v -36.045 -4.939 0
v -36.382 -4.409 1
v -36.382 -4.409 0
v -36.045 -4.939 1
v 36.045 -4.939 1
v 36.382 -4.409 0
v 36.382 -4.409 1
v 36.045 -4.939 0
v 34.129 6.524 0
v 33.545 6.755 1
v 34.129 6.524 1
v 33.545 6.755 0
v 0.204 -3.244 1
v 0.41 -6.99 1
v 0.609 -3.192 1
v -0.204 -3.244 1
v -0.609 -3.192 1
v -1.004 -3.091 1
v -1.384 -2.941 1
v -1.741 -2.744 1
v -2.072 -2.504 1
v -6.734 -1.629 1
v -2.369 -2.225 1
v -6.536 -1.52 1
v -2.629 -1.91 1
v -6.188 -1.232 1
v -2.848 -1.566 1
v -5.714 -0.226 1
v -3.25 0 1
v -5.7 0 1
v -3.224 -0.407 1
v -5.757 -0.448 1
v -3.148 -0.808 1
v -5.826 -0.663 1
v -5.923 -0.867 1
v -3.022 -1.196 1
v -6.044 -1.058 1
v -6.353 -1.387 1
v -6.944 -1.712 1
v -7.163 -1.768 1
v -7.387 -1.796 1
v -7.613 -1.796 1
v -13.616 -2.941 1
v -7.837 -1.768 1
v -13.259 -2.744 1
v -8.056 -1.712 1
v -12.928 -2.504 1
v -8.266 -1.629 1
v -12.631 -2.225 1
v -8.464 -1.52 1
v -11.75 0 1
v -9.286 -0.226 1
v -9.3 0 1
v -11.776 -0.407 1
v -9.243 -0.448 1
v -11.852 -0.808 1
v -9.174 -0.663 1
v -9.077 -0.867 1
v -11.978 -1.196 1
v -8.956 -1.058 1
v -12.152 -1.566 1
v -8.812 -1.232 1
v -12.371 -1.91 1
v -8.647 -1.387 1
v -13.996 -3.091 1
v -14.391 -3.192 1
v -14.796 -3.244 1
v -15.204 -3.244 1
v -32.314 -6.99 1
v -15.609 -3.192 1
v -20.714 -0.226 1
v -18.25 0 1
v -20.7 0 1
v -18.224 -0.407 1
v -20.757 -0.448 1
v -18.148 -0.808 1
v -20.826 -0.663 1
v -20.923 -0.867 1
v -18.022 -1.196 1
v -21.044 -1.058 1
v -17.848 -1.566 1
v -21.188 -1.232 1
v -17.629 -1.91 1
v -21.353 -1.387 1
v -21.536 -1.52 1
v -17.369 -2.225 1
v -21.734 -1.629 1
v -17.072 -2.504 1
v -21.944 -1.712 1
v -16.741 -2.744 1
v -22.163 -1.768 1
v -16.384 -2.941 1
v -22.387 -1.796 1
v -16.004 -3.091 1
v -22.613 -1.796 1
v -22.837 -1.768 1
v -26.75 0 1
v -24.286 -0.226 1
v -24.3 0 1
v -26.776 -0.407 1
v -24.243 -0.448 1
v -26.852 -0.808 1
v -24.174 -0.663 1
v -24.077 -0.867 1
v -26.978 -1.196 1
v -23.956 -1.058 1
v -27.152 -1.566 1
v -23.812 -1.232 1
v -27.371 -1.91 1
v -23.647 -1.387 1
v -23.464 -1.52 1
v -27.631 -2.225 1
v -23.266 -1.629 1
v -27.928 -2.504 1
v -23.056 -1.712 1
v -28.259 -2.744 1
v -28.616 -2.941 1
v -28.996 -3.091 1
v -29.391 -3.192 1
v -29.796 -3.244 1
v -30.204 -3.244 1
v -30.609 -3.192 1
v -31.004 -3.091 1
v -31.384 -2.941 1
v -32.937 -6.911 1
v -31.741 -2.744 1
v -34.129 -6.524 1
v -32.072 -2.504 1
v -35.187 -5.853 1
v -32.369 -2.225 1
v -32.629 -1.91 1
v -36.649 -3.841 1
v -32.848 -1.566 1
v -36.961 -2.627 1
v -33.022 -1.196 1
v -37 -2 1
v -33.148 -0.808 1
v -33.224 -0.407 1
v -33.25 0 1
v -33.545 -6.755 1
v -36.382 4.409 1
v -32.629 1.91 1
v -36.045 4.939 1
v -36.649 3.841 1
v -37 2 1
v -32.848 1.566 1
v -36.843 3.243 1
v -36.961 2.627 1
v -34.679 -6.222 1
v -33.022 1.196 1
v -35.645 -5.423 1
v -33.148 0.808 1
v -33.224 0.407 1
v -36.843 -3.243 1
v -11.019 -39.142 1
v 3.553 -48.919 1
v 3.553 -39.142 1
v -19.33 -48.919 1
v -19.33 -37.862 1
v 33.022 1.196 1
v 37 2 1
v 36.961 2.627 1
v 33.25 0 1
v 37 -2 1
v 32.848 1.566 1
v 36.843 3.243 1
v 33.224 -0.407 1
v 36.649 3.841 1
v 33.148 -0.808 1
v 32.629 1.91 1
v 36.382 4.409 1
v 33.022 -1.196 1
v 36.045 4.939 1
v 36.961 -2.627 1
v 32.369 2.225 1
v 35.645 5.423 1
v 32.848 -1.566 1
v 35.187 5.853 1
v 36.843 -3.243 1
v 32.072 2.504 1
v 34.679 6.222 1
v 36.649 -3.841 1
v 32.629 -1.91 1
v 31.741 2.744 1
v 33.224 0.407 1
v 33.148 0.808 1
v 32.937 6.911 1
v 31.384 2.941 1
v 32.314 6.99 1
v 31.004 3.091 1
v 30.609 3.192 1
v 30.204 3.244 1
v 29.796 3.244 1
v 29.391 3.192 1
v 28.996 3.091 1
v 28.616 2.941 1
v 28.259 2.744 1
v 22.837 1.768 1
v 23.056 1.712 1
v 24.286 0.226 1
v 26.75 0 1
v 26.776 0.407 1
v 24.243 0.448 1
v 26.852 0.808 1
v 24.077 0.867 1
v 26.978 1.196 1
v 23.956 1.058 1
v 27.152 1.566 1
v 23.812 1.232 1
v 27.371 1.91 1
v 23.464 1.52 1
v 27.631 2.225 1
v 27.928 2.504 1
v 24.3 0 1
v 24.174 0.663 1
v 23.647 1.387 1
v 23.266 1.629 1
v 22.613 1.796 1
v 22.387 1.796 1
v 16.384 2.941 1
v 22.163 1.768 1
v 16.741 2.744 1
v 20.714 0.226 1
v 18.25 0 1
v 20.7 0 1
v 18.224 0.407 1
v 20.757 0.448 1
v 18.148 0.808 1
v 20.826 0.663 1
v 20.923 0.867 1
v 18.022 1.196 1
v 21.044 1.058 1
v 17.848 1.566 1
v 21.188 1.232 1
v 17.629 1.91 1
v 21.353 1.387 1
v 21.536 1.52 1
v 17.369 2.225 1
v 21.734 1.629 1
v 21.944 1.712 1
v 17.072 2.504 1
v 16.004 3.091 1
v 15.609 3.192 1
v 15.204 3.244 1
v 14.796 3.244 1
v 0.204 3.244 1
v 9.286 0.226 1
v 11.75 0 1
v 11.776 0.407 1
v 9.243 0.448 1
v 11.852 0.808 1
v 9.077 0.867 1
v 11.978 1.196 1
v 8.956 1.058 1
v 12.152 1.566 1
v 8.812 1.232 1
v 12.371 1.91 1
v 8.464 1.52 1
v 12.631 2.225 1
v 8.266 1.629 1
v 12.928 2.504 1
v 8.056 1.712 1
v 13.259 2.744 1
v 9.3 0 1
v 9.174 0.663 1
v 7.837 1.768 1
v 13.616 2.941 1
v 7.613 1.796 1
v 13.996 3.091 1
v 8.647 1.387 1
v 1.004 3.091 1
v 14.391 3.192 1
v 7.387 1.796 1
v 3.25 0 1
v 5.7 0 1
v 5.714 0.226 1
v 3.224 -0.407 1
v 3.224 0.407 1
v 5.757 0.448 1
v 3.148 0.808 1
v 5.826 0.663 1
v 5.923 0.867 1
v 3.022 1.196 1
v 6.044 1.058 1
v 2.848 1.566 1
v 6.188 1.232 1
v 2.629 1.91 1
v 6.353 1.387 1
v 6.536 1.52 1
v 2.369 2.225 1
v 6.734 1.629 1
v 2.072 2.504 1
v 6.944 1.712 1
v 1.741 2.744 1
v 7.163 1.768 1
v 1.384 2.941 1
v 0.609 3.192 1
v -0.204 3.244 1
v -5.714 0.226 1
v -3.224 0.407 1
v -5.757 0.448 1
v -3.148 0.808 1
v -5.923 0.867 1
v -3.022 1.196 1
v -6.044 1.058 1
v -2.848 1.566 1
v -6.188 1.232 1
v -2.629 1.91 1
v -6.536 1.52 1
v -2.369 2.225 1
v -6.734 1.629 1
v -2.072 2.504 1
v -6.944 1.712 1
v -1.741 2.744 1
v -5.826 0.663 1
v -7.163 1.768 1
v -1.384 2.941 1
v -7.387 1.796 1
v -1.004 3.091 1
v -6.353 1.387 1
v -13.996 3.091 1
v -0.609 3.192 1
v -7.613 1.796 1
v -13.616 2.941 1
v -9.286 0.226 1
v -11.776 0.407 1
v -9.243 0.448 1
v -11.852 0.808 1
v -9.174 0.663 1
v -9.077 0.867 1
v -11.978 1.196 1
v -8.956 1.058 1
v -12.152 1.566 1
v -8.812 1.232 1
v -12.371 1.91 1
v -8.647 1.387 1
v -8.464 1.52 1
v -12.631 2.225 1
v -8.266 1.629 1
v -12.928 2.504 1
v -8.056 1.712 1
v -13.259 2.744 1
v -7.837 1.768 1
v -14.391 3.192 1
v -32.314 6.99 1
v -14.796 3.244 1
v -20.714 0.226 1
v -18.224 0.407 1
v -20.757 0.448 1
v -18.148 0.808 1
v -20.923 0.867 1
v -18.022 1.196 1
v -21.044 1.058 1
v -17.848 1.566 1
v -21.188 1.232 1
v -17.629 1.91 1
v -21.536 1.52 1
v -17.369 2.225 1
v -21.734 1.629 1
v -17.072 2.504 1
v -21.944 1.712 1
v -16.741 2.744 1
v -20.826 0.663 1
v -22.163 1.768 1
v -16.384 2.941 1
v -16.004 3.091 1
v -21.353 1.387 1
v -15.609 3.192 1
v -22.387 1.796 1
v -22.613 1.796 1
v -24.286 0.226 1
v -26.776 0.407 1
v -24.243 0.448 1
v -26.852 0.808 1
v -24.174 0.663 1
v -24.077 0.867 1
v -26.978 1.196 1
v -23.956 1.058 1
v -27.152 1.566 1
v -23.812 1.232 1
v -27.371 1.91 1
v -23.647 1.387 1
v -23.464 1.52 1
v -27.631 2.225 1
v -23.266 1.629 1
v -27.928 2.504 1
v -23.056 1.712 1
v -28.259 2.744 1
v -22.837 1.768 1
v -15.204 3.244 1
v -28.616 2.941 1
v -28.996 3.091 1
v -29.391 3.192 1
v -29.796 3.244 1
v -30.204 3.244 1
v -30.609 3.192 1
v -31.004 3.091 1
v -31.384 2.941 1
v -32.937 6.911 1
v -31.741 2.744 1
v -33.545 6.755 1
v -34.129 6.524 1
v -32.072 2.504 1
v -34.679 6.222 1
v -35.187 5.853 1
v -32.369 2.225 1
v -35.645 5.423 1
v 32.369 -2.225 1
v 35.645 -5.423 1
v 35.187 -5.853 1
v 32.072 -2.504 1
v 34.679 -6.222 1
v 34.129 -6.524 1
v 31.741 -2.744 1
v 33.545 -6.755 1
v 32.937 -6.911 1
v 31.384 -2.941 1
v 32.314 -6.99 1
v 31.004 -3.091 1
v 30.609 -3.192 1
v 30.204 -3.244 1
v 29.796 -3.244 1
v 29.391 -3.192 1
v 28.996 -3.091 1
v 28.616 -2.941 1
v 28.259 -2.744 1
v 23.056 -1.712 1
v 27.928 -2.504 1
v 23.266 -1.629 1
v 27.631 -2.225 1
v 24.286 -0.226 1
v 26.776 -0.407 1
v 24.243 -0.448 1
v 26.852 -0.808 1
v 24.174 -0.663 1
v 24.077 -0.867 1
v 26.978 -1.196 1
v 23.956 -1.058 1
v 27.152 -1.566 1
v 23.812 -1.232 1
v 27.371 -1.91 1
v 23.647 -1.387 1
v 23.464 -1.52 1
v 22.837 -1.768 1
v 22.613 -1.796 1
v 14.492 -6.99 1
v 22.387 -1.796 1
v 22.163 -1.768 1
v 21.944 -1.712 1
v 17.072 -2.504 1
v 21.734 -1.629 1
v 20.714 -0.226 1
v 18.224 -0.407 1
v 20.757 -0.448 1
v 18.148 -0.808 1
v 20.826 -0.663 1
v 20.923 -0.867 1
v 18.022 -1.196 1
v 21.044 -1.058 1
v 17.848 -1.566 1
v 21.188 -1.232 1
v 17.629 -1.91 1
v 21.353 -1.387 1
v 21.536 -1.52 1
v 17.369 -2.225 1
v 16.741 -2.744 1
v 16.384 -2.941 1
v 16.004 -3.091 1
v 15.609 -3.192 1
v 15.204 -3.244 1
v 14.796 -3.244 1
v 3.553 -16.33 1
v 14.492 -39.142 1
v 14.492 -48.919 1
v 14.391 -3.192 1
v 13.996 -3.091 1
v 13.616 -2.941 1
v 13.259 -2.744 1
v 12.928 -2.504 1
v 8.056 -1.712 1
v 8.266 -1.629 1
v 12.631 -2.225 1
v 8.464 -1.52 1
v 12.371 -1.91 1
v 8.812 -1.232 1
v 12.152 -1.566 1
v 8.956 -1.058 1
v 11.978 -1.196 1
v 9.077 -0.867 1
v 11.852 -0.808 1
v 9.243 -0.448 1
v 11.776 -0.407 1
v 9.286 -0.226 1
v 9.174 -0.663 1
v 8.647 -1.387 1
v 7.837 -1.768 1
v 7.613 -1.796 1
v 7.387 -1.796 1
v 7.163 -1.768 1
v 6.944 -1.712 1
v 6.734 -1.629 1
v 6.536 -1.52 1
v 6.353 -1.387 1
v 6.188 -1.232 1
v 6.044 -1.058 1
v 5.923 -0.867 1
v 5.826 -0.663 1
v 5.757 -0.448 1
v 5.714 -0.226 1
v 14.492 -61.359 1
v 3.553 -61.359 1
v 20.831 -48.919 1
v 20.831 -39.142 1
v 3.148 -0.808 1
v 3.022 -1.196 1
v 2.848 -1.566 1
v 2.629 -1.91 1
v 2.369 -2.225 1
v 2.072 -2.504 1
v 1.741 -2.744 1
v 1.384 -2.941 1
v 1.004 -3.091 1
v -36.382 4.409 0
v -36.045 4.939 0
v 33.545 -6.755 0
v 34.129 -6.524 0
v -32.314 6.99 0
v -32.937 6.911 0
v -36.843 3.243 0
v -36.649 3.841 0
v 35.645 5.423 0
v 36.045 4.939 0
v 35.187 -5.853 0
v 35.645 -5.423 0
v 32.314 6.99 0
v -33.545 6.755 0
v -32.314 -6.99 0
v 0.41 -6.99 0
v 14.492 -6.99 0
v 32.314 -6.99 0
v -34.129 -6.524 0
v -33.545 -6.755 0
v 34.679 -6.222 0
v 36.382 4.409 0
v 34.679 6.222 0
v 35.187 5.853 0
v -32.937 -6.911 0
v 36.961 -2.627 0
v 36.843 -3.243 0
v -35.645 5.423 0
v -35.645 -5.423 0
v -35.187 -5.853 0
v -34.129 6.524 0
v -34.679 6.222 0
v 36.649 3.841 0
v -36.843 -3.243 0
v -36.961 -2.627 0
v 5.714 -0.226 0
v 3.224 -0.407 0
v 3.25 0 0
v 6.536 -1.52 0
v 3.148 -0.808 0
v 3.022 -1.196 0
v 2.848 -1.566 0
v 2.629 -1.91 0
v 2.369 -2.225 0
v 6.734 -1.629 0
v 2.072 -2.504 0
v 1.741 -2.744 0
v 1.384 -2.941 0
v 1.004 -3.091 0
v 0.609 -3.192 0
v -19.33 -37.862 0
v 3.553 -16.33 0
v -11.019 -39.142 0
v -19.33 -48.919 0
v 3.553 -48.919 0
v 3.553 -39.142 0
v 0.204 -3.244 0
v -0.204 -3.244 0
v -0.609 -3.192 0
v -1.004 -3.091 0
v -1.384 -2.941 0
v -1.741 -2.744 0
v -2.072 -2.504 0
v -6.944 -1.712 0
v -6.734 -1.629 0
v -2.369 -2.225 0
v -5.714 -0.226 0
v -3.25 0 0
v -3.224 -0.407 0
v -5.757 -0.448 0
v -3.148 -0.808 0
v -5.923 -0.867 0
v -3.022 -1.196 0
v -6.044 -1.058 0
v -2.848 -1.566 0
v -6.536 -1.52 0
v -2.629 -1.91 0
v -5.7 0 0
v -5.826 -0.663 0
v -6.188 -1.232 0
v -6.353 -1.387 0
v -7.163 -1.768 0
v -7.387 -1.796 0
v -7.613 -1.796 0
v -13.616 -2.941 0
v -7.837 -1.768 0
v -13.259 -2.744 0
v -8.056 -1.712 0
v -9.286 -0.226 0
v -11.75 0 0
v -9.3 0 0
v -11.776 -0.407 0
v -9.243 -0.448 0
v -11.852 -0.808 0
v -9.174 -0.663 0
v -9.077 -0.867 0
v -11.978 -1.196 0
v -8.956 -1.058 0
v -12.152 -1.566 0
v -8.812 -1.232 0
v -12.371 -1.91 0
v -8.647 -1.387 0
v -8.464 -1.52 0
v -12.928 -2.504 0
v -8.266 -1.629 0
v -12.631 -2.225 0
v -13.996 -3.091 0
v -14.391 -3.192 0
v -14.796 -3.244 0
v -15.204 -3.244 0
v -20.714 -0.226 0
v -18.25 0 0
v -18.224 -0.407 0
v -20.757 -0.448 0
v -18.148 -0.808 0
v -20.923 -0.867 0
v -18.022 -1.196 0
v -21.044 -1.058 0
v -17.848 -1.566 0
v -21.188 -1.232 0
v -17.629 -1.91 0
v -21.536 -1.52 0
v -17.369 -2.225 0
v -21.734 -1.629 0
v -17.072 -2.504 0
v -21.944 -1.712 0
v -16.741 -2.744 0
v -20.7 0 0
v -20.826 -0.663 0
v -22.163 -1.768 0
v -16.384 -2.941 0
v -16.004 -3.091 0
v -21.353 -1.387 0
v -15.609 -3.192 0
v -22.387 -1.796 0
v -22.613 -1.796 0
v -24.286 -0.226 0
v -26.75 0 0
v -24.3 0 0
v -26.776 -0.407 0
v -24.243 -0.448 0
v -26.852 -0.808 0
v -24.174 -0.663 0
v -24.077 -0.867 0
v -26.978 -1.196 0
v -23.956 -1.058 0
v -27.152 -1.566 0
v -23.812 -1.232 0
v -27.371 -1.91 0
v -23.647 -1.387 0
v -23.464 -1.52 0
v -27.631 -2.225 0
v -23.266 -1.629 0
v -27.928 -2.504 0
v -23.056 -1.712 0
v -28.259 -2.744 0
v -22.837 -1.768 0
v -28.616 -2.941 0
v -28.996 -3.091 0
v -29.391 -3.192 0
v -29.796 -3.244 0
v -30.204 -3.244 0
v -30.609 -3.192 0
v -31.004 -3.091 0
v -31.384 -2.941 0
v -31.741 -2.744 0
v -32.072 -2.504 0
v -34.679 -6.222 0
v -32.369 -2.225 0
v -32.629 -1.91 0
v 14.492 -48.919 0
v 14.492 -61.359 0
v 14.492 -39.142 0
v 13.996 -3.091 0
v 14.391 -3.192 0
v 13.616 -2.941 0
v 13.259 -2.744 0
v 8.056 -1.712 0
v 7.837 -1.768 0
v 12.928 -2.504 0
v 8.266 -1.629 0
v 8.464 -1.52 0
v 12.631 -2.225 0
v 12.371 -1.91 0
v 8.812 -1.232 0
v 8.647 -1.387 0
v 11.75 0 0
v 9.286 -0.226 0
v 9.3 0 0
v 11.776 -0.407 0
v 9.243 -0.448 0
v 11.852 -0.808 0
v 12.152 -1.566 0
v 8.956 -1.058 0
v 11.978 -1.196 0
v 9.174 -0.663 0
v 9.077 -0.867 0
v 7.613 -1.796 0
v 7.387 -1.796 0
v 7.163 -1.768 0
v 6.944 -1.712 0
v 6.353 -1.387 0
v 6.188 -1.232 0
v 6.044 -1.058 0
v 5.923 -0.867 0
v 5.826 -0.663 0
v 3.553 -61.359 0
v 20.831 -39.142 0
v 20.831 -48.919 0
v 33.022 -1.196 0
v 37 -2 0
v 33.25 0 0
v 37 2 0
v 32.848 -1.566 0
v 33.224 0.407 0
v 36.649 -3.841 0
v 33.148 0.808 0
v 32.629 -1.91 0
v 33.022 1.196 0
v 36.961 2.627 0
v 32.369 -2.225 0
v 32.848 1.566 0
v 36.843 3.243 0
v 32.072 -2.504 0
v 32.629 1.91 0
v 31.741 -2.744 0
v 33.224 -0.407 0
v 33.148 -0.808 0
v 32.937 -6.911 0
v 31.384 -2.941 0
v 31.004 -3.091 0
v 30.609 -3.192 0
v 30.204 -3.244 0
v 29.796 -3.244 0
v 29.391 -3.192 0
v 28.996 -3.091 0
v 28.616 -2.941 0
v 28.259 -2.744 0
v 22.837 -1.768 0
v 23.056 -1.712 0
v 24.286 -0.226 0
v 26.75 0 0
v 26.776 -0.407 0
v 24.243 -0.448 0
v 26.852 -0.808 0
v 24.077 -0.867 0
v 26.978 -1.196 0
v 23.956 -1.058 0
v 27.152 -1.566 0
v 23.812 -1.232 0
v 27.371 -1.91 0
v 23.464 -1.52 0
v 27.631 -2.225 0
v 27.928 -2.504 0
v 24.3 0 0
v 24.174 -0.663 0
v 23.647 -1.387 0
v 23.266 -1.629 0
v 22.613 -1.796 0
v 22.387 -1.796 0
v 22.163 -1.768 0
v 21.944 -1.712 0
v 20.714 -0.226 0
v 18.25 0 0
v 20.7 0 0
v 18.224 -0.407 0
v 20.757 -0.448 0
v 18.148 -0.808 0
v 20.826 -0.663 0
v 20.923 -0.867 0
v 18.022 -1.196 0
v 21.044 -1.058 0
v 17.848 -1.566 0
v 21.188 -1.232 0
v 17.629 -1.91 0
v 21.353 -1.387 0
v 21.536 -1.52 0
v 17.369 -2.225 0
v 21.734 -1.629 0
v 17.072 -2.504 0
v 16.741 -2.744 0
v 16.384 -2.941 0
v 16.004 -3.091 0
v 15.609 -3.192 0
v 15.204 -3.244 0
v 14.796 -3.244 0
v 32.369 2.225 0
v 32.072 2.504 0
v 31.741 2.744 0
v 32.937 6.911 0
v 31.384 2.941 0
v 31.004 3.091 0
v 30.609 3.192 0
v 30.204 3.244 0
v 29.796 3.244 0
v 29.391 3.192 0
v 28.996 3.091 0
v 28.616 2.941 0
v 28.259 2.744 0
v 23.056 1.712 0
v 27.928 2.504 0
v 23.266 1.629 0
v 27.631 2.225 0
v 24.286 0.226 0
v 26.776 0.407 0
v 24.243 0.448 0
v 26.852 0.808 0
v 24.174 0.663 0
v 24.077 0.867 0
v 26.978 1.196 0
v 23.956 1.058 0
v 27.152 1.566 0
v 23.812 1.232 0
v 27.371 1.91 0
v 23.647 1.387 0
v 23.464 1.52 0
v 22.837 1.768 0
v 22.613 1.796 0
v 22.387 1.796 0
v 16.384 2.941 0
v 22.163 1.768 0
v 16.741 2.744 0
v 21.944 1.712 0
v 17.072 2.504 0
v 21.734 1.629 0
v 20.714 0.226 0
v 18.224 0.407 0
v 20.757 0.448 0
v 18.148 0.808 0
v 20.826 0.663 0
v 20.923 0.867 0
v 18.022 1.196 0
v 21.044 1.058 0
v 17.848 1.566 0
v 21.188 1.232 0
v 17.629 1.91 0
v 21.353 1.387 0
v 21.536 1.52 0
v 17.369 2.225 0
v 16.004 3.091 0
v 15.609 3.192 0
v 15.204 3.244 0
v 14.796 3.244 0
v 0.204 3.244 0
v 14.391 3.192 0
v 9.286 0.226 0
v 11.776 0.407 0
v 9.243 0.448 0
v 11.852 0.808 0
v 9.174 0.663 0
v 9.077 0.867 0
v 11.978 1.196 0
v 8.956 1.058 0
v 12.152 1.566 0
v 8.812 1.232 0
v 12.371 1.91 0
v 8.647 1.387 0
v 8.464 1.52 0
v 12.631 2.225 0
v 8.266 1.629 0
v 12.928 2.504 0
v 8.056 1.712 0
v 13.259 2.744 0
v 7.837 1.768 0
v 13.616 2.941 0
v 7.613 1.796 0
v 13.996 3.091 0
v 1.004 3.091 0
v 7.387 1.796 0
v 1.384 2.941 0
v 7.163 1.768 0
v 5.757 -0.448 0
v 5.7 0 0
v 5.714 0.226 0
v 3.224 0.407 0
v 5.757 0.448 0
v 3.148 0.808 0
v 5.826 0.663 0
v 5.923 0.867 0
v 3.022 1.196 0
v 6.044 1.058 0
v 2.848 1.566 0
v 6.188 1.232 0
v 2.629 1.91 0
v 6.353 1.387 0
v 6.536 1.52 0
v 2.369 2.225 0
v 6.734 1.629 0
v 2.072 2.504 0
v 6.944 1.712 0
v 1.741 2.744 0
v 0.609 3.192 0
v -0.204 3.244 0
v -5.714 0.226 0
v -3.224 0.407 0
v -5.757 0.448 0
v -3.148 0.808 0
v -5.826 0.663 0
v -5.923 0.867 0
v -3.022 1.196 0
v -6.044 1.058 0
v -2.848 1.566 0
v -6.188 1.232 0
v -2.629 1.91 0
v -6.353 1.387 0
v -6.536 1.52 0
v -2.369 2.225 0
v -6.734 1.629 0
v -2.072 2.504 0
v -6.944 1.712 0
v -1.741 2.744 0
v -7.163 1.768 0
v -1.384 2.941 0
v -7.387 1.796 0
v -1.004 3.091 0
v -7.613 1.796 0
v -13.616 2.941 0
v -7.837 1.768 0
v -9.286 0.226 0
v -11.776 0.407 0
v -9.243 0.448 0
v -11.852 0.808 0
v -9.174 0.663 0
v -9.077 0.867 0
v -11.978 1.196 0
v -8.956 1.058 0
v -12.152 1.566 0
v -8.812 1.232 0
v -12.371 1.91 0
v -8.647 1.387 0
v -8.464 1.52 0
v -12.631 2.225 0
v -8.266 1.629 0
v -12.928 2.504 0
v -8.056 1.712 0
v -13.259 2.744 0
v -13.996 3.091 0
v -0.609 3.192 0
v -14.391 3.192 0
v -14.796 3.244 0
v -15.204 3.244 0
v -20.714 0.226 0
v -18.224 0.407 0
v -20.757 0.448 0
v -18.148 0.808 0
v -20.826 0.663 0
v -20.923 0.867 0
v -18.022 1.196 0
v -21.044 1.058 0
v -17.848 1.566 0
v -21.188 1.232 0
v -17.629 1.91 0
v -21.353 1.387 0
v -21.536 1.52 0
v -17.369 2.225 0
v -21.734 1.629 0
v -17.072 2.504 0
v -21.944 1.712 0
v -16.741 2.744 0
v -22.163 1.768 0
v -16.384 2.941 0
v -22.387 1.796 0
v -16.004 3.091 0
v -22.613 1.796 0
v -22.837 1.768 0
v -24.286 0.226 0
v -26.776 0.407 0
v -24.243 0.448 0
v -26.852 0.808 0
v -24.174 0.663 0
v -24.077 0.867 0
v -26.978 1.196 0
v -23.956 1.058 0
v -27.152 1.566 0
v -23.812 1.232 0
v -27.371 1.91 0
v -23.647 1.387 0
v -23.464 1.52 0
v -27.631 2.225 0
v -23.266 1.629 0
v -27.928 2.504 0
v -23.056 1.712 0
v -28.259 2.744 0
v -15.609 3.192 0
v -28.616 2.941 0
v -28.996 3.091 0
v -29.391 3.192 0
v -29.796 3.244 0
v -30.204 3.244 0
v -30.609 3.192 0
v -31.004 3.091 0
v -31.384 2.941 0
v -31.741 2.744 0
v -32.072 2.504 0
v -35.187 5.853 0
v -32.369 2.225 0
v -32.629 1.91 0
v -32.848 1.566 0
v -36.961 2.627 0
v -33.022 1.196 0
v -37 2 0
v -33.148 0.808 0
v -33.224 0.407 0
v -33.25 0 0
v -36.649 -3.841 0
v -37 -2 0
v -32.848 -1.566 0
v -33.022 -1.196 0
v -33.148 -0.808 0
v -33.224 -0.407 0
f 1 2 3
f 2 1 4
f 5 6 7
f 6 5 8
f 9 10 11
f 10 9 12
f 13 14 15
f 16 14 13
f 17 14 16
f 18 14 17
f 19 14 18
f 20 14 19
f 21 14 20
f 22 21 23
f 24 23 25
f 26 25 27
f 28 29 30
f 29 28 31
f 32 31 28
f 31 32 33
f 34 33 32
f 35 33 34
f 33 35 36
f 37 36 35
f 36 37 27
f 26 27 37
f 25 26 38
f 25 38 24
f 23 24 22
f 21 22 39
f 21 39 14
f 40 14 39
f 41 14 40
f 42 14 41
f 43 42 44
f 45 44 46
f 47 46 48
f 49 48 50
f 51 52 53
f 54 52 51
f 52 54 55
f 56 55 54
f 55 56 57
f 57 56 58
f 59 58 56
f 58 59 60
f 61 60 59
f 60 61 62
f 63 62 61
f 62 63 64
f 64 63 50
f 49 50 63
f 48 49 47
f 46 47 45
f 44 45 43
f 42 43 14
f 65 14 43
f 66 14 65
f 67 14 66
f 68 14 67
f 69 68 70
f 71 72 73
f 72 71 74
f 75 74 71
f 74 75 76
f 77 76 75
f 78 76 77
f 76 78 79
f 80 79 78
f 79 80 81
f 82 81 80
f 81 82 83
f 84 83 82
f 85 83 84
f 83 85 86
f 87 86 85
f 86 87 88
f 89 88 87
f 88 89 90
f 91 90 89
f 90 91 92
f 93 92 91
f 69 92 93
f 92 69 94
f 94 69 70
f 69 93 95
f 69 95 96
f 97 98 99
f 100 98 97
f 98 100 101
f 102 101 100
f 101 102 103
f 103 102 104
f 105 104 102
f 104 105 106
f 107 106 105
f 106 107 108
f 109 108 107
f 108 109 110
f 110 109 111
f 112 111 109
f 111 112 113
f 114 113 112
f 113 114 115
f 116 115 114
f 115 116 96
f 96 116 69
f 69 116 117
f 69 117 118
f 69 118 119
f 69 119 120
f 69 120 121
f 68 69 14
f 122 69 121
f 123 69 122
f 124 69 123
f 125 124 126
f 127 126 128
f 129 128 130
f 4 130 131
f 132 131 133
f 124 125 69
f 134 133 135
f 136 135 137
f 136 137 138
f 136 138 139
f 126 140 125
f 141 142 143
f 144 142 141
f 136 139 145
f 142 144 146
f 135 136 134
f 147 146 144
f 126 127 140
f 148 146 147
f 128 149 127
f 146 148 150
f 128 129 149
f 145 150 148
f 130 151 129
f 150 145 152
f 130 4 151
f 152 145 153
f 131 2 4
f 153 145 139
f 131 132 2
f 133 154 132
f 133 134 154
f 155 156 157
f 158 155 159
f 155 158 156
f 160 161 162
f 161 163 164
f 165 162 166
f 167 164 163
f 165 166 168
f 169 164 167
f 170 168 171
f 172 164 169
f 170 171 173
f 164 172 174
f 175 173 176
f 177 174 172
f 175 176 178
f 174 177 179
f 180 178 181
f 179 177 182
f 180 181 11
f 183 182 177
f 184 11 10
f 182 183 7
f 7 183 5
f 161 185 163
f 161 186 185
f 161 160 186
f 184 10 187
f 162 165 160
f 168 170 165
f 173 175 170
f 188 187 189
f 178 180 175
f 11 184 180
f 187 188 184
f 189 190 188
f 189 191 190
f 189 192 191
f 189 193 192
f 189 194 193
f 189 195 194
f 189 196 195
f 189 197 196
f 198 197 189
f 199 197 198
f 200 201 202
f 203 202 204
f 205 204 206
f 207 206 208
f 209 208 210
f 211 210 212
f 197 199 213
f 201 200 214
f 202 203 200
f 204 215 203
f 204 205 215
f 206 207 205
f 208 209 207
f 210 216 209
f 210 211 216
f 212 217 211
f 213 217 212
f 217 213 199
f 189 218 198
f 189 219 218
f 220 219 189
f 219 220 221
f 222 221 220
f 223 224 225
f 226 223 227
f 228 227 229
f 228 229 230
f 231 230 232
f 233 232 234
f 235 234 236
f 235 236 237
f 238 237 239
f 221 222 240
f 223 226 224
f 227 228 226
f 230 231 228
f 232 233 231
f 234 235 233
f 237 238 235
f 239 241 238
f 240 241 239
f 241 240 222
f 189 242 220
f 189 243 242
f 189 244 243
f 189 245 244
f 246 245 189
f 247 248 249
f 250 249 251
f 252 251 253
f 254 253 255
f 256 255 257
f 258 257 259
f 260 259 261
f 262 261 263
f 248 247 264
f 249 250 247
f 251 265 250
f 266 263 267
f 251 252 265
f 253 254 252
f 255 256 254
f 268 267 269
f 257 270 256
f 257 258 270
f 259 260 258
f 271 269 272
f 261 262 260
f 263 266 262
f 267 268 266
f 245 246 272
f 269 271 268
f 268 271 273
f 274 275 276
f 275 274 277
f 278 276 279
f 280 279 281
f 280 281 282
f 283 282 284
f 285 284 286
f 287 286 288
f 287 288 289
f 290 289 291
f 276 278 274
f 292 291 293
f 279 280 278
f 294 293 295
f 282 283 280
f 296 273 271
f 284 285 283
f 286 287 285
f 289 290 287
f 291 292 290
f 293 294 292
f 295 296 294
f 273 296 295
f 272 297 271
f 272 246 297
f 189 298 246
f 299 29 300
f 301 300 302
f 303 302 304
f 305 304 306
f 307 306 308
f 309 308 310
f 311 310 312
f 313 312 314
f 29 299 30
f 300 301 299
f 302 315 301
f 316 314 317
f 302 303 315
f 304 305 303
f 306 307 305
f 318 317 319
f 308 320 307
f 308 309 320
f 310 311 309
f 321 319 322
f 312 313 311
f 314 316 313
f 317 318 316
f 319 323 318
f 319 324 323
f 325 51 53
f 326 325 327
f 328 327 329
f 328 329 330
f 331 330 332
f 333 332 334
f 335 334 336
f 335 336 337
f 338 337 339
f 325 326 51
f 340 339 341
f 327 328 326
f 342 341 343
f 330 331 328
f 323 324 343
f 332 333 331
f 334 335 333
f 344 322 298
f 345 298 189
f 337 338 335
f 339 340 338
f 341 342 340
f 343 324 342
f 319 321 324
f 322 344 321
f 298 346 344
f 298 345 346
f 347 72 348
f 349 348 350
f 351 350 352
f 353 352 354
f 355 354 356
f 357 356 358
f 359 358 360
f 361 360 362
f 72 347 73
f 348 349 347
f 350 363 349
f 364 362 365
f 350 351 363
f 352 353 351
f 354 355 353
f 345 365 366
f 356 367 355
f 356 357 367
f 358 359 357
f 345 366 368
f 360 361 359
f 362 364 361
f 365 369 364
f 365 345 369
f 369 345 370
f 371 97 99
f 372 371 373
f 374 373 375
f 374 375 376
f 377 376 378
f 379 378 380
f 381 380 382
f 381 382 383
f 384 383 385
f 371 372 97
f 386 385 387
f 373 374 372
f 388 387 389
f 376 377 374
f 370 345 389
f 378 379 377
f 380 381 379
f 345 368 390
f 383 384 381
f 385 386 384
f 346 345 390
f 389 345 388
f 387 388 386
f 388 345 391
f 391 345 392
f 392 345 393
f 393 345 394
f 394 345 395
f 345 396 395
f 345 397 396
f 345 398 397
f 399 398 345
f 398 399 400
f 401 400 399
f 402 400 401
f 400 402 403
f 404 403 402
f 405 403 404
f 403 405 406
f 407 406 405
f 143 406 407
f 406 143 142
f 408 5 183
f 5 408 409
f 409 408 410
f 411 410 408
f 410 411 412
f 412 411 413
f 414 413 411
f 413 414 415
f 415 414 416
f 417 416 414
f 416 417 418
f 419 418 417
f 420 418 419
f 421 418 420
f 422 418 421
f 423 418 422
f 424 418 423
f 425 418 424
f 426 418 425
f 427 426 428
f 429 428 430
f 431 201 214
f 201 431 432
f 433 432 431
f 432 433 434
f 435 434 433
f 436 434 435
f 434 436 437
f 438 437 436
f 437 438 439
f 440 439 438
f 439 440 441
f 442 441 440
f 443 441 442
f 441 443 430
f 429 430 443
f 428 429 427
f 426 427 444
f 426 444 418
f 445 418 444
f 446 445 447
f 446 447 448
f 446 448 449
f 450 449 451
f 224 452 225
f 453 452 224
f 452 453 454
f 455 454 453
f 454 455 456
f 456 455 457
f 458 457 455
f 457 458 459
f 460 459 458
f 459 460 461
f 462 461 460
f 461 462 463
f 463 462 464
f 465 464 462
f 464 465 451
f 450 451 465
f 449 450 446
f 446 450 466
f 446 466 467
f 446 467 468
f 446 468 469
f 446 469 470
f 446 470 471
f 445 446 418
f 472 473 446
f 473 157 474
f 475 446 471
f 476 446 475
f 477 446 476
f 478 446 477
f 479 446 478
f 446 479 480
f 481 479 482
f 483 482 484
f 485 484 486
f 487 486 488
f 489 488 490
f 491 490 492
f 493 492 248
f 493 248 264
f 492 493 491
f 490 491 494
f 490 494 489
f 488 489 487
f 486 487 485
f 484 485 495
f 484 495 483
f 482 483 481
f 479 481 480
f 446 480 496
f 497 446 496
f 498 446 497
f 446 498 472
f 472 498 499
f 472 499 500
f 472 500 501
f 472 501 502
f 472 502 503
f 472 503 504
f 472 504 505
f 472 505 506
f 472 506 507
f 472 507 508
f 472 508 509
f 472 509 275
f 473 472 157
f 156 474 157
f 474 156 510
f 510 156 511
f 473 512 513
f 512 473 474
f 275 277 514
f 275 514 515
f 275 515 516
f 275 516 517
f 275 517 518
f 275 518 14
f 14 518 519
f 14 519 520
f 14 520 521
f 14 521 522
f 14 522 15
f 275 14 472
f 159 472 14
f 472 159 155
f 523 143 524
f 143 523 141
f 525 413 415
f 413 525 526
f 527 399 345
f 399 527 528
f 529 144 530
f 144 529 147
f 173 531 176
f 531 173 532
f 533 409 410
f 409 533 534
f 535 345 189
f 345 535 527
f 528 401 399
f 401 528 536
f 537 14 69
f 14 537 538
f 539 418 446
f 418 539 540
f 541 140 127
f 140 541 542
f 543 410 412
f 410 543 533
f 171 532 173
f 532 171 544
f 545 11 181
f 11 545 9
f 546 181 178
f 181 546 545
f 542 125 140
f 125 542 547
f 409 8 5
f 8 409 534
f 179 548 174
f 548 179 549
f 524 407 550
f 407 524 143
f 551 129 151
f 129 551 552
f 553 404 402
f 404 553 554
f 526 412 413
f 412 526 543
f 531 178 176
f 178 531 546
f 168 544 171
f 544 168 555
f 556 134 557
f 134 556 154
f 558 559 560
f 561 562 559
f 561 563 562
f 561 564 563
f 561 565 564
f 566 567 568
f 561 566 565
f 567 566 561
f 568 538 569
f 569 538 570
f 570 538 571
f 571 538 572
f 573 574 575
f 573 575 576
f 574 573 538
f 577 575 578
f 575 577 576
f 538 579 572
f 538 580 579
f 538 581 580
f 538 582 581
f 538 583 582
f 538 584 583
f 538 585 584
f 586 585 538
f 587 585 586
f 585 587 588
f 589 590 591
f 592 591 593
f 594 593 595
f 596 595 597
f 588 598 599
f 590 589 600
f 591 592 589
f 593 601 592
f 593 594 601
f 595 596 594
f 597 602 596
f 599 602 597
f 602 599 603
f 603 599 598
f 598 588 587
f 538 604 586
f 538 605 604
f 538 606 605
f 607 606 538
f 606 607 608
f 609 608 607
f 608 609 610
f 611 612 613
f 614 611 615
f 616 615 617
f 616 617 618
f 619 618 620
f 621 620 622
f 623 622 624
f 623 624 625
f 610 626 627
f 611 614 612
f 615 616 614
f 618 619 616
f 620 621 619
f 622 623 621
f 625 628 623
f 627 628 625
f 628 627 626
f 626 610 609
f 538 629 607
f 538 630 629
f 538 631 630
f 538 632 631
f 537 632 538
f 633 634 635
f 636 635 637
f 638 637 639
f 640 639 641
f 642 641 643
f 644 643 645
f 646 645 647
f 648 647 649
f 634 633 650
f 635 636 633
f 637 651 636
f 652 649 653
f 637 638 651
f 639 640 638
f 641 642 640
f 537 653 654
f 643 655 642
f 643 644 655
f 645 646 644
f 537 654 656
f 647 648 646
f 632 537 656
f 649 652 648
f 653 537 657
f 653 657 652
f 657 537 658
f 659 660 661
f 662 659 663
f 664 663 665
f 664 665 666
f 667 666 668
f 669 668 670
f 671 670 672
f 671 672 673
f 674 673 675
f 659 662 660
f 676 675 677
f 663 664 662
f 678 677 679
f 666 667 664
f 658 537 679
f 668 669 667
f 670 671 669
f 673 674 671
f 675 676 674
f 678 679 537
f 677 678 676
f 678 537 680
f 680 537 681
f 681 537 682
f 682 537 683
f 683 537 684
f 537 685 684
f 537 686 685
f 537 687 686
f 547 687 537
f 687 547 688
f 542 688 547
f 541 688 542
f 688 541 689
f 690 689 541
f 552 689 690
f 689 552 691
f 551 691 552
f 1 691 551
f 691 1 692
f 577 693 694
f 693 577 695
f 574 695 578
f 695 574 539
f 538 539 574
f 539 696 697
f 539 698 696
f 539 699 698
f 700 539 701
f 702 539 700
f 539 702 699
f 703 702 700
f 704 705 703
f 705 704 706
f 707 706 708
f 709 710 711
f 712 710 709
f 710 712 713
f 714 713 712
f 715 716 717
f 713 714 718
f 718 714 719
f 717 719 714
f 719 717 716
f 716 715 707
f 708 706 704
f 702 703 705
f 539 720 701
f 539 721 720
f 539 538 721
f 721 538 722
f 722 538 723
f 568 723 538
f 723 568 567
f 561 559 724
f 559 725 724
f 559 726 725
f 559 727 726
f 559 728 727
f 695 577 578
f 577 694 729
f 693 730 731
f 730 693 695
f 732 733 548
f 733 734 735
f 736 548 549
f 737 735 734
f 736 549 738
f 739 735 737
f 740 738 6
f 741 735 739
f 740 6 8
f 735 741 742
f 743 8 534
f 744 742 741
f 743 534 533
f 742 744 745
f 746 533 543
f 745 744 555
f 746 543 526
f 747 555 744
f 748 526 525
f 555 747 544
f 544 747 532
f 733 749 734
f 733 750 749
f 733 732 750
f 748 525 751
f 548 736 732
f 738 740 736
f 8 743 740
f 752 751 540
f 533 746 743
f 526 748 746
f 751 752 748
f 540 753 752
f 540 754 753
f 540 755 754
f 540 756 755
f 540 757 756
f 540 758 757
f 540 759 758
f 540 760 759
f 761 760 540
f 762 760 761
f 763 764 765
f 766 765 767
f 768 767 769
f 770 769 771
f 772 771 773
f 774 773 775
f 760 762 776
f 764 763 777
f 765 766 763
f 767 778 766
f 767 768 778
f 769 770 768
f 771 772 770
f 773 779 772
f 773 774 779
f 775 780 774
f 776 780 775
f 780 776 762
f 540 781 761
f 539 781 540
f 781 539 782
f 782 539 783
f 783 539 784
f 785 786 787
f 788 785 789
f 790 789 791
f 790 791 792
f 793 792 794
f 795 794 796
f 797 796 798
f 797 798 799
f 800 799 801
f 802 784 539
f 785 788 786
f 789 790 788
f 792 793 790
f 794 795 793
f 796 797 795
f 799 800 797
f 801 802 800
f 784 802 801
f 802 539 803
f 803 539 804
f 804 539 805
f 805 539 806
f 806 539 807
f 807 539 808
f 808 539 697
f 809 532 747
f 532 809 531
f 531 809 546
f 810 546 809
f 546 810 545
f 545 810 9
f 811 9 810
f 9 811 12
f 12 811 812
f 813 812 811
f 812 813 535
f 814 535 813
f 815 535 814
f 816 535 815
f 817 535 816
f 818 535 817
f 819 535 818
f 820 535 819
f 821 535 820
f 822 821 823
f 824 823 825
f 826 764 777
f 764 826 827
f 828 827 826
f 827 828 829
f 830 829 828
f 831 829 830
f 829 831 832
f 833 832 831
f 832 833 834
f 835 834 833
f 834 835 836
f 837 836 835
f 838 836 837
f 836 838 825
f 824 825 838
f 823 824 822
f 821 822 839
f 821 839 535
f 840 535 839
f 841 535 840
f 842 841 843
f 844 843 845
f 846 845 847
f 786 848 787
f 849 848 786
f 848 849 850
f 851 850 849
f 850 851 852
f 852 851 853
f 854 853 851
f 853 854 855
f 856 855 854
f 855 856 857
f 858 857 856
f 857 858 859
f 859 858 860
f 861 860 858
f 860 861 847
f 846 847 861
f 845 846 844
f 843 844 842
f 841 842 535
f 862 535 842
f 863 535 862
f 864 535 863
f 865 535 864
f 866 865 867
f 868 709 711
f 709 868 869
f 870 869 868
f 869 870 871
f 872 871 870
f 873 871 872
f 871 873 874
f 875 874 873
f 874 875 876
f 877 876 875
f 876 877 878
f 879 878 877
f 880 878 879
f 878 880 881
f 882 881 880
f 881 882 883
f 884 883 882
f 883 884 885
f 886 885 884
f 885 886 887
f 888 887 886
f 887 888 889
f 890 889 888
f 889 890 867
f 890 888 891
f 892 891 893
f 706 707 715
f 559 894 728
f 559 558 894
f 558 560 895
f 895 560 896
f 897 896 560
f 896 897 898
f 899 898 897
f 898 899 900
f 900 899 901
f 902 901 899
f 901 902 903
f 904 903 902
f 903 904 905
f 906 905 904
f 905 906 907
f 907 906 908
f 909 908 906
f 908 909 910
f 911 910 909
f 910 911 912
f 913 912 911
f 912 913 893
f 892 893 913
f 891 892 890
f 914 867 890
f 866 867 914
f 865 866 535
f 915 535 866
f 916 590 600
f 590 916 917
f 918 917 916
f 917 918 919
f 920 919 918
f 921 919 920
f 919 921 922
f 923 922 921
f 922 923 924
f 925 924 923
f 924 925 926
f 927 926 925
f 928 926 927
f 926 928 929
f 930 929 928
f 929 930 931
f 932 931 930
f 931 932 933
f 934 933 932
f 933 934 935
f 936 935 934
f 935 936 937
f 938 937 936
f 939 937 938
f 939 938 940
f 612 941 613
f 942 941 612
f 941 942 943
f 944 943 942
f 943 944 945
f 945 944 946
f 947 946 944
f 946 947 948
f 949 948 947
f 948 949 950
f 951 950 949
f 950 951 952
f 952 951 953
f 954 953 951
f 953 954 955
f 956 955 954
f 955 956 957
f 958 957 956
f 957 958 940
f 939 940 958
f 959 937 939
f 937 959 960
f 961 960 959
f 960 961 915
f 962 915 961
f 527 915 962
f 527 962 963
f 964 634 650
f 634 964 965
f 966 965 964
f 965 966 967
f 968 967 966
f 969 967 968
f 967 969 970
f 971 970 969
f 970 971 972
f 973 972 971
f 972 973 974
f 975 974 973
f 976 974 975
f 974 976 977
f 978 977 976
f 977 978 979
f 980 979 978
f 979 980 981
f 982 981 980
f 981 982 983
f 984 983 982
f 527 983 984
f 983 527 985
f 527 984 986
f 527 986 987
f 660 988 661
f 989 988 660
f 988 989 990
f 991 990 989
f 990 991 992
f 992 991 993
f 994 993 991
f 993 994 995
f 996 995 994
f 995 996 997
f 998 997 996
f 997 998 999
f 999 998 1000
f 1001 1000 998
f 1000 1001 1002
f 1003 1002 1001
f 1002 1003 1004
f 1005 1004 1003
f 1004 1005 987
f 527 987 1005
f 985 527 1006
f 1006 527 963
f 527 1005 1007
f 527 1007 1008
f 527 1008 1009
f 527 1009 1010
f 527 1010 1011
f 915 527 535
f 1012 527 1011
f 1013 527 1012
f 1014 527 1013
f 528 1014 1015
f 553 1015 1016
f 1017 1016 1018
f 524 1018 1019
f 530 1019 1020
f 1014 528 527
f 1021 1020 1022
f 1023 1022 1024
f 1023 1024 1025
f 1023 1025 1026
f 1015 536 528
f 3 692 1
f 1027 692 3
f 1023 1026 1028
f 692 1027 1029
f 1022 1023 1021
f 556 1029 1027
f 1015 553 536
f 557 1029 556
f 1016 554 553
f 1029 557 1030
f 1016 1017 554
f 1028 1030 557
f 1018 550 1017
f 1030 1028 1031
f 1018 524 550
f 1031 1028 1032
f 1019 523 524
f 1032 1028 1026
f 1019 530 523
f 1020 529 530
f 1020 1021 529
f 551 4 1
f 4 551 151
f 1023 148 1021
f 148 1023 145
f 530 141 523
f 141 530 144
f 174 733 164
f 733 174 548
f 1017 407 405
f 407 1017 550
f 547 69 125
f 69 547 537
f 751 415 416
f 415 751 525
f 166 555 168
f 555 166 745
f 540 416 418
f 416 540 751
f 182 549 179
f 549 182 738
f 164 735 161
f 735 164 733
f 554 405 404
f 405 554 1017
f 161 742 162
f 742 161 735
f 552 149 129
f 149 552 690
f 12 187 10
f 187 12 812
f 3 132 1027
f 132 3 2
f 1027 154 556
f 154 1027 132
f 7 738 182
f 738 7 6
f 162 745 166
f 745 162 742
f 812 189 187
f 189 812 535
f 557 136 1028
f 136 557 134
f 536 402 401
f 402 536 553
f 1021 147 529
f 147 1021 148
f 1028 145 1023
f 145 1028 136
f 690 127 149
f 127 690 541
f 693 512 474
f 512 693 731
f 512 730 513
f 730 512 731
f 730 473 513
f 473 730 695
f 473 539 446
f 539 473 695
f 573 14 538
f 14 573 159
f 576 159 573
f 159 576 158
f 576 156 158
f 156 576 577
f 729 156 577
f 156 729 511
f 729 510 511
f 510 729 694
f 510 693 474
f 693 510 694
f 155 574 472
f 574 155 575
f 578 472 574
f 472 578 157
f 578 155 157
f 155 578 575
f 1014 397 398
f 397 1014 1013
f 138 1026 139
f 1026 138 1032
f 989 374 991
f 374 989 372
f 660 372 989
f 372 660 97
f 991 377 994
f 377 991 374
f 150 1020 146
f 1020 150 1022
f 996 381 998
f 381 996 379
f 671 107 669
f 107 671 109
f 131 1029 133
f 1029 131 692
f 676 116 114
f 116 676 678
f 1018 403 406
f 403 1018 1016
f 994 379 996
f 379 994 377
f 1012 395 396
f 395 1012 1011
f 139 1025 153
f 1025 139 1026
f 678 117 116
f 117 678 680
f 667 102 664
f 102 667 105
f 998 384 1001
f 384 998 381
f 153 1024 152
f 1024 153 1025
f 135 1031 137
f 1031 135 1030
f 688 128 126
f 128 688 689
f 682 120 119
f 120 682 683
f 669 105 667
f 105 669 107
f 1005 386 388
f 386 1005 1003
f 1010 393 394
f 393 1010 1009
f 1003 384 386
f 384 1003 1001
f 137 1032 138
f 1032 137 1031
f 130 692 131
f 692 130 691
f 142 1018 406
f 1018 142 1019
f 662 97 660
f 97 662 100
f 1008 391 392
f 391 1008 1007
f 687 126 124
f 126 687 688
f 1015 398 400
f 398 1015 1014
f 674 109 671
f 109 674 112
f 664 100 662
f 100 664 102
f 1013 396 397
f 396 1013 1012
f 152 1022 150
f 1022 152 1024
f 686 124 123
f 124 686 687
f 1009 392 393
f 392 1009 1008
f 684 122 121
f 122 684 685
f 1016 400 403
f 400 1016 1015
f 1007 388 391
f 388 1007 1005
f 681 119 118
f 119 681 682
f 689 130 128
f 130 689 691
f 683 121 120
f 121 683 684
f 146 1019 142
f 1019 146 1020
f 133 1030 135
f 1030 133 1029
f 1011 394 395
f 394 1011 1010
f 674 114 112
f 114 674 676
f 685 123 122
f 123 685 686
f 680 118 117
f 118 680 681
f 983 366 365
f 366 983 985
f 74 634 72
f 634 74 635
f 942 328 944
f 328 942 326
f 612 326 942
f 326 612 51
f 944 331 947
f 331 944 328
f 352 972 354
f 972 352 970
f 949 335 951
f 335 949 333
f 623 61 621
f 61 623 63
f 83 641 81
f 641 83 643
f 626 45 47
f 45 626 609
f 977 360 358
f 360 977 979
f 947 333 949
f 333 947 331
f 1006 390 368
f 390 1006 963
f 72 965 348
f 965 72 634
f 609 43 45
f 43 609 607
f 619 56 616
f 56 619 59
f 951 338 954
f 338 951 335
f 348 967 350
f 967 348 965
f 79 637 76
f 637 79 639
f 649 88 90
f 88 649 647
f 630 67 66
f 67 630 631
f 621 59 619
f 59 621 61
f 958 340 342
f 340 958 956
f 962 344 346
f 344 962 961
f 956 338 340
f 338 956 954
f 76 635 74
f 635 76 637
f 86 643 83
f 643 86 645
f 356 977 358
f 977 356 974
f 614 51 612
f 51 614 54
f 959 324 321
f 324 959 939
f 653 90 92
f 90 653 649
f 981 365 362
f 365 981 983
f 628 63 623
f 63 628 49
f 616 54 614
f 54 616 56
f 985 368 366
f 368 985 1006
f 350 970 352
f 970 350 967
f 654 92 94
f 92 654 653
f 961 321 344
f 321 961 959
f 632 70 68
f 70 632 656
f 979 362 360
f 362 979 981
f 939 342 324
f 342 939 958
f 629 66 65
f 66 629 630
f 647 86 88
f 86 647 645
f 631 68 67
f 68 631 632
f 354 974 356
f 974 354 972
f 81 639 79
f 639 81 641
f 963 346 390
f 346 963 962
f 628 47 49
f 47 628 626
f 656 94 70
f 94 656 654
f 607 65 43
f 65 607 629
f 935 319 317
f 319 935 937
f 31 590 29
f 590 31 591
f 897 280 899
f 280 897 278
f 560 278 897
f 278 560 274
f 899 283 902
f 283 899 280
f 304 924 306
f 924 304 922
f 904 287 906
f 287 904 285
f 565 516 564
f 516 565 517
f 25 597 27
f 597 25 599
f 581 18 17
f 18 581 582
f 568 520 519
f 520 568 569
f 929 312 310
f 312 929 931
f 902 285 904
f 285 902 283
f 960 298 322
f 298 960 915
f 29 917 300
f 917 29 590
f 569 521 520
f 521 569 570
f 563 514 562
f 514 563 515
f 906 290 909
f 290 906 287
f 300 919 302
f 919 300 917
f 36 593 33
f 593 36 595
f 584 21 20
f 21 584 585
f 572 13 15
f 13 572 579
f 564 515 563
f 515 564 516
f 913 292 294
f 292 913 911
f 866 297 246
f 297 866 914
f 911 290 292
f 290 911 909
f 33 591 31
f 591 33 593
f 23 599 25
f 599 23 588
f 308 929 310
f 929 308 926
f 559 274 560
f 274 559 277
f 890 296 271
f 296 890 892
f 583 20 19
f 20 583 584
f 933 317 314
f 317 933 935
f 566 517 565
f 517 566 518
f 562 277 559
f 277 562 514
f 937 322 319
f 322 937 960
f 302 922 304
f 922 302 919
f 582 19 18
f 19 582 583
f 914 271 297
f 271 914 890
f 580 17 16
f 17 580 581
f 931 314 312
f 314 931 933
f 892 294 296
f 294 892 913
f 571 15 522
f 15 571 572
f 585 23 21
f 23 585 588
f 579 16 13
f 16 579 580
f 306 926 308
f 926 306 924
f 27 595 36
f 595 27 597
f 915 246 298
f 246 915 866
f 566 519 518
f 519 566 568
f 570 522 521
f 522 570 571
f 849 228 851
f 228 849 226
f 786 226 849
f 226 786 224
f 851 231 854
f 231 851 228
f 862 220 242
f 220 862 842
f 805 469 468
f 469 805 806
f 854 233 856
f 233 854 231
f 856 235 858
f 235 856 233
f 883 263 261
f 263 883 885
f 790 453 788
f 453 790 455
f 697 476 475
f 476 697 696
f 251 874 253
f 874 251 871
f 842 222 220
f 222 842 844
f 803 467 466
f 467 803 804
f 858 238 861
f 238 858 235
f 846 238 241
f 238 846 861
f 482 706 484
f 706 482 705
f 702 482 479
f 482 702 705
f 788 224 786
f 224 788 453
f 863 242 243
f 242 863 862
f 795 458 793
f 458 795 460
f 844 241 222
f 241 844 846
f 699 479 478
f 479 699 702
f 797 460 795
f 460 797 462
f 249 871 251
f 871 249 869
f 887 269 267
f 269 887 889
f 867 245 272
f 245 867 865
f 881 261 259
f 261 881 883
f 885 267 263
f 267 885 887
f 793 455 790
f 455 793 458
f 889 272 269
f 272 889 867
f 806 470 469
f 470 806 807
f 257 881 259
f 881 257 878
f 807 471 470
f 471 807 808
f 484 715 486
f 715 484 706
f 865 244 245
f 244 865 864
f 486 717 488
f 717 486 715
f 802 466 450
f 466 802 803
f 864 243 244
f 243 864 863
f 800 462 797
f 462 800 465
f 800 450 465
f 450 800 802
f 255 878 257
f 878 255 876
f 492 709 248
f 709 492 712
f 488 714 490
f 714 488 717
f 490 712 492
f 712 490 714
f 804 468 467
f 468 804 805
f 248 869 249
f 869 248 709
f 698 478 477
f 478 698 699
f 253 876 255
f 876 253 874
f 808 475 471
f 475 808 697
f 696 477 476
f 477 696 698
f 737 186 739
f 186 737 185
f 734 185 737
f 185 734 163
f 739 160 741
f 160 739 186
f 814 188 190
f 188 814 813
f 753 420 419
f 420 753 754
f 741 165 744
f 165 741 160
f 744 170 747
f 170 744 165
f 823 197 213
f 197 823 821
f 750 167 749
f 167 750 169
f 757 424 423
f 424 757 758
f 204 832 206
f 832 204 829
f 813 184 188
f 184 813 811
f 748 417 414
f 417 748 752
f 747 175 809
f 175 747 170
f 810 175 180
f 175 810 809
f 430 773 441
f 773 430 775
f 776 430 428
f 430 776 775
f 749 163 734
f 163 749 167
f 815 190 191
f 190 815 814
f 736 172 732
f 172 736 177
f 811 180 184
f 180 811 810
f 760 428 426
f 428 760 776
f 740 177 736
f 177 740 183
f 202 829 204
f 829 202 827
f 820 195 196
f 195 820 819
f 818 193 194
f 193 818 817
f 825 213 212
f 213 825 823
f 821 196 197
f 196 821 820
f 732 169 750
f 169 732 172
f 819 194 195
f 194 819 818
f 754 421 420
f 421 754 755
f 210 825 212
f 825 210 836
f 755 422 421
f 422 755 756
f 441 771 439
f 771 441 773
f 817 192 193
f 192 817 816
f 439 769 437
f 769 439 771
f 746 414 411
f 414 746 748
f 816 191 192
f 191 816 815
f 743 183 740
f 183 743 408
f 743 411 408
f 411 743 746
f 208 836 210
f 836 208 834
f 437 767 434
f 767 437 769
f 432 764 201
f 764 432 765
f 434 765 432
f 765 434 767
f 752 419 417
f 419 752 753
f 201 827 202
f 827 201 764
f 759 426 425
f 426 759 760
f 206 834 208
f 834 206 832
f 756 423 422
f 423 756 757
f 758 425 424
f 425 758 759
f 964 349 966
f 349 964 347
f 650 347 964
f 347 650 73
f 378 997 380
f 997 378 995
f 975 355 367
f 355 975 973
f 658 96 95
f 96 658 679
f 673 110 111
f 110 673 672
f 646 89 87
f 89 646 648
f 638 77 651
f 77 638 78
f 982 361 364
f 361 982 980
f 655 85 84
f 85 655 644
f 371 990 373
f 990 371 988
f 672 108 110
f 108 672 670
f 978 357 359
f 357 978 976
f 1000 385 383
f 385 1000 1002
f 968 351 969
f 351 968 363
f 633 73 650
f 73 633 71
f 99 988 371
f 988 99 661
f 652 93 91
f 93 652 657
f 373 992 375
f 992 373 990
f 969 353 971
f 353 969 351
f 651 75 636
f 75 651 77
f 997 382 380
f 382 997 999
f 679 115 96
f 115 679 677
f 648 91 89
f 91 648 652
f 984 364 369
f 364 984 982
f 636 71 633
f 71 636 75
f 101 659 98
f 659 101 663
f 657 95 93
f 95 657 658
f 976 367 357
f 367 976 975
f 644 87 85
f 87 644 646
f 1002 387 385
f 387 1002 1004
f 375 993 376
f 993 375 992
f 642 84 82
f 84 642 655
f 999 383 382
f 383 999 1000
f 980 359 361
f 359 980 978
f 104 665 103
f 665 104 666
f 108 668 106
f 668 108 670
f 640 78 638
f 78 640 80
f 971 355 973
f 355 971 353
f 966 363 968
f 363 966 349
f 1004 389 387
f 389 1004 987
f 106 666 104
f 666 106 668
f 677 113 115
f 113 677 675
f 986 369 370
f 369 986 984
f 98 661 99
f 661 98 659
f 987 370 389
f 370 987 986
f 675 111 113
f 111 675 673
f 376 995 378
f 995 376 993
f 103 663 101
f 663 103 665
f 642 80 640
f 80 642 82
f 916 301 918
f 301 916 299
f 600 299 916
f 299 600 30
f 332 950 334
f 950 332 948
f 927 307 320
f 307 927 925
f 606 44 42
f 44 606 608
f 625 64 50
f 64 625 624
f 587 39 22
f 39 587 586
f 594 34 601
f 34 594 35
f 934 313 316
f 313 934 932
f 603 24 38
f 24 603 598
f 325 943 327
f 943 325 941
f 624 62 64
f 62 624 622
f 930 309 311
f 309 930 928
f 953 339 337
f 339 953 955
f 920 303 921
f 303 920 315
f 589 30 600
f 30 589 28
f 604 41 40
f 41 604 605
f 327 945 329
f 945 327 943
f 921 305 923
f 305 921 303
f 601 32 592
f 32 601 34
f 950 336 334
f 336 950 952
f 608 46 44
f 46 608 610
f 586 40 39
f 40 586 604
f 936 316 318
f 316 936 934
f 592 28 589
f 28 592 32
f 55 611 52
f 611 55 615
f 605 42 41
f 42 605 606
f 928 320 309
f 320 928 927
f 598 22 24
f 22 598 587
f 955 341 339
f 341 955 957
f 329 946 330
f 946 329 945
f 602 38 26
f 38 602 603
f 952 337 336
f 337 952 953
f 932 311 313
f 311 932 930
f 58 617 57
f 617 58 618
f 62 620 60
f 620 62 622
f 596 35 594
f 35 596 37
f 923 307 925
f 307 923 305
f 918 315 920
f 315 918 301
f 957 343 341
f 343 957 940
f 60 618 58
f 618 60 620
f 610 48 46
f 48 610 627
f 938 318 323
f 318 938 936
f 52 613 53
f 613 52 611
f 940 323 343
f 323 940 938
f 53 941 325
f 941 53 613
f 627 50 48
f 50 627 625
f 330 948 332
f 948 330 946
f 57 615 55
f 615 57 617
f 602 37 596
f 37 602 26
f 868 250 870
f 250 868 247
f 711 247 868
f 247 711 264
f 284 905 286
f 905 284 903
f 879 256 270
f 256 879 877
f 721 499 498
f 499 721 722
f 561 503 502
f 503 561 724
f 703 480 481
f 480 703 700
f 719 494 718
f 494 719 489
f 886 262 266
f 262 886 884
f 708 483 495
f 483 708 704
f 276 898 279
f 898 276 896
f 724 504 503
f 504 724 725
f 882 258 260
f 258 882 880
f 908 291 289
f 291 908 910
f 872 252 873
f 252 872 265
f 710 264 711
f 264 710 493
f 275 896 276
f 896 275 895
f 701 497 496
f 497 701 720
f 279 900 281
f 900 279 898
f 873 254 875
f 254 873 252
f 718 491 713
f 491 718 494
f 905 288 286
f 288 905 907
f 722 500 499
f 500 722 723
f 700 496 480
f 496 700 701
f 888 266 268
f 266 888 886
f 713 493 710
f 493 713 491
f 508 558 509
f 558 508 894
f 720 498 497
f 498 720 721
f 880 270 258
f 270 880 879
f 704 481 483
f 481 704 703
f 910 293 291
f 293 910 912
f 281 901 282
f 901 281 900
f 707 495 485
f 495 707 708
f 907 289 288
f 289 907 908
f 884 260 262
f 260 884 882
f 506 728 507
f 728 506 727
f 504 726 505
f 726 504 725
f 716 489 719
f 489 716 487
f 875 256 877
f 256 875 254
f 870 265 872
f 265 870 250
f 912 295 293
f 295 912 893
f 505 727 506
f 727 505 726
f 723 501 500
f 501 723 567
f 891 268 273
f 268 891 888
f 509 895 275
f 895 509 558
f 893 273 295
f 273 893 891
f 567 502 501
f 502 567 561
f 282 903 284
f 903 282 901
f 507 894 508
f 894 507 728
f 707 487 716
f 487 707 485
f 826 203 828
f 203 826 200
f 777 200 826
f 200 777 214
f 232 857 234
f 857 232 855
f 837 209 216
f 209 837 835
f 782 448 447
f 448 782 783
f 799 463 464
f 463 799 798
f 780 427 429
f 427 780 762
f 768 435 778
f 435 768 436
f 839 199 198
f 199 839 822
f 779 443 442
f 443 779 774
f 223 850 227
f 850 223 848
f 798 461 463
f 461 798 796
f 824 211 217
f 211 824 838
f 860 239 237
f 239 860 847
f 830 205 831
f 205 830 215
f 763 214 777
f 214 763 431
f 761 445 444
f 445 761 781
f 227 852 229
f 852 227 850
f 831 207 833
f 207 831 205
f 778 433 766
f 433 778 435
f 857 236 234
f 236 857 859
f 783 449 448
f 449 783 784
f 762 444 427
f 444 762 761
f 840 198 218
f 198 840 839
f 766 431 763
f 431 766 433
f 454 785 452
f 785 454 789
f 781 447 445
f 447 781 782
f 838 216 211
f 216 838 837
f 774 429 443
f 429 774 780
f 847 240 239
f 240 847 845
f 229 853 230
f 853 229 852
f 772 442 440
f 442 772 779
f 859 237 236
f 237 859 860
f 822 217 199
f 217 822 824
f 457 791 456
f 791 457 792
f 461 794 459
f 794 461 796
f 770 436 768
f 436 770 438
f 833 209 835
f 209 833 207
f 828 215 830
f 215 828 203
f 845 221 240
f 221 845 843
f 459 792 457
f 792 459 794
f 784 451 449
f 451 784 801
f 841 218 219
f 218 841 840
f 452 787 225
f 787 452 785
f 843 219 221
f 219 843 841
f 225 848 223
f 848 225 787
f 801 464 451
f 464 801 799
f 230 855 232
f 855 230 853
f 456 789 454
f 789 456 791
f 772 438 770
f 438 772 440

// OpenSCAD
$fn = 50;


difference() {
	union() {
		hull() {
			translate(v = [-32.0000000000, 2.0000000000, 0]) {
				cylinder(h = 1, r = 5);
			}
			translate(v = [32.0000000000, 2.0000000000, 0]) {
				cylinder(h = 1, r = 5);
			}
			translate(v = [-32.0000000000, -2.0000000000, 0]) {
				cylinder(h = 1, r = 5);
			}
			translate(v = [32.0000000000, -2.0000000000, 0]) {
				cylinder(h = 1, r = 5);
			}
		}
		translate(v = [0, -5, 0]) {
			linear_extrude(height = 1) {
				text(font = "DejaVu Sans Mono:style=Bold", halign = "center", size = 57.0000000000, text = "4", valign = "top");
			}
		}
	}
	union() {
		translate(v = [-30.0000000000, 0.0000000000, 0]) {
			translate(v = [0, 0, -100]) {
				cylinder(h = 200, r = 3.2500000000);
			}
		}
		translate(v = [-15.0000000000, 0.0000000000, 0]) {
			translate(v = [0, 0, -100]) {
				cylinder(h = 200, r = 3.2500000000);
			}
		}
		translate(v = [0, 0, -100]) {
			cylinder(h = 200, r = 3.2500000000);
		}
		translate(v = [15.0000000000, 0.0000000000, 0]) {
			translate(v = [0, 0, -100]) {
				cylinder(h = 200, r = 3.2500000000);
			}
		}
		translate(v = [30.0000000000, 0.0000000000, 0]) {
			translate(v = [0, 0, -100]) {
				cylinder(h = 200, r = 3.2500000000);
			}
		}
		translate(v = [-30.0000000000, 0.0000000000, 0]) {
			translate(v = [0, 0, -100]) {
				cylinder(h = 200, r = 1.8000000000);
			}
		}
		translate(v = [-22.5000000000, 0.0000000000, 0]) {
			translate(v = [0, 0, -100]) {
				cylinder(h = 200, r = 1.8000000000);
			}
		}
		translate(v = [-15.0000000000, 0.0000000000, 0]) {
			translate(v = [0, 0, -100]) {
				cylinder(h = 200, r = 1.8000000000);
			}
		}
		translate(v = [-7.5000000000, 0.0000000000, 0]) {
			translate(v = [0, 0, -100]) {
				cylinder(h = 200, r = 1.8000000000);
			}
		}
		translate(v = [0, 0, -100]) {
			cylinder(h = 200, r = 1.8000000000);
		}
		translate(v = [7.5000000000, 0.0000000000, 0]) {
			translate(v = [0, 0, -100]) {
				cylinder(h = 200, r = 1.8000000000);
			}
		}
		translate(v = [15.0000000000, 0.0000000000, 0]) {
			translate(v = [0, 0, -100]) {
				cylinder(h = 200, r = 1.8000000000);
			}
		}
		translate(v = [22.5000000000, 0.0000000000, 0]) {
			translate(v = [0, 0, -100]) {
				cylinder(h = 200, r = 1.8000000000);
			}
		}
		translate(v = [30.0000000000, 0.0000000000, 0]) {
			translate(v = [0, 0, -100]) {
				cylinder(h = 200, r = 1.8000000000);
			}
		}
	}
}
